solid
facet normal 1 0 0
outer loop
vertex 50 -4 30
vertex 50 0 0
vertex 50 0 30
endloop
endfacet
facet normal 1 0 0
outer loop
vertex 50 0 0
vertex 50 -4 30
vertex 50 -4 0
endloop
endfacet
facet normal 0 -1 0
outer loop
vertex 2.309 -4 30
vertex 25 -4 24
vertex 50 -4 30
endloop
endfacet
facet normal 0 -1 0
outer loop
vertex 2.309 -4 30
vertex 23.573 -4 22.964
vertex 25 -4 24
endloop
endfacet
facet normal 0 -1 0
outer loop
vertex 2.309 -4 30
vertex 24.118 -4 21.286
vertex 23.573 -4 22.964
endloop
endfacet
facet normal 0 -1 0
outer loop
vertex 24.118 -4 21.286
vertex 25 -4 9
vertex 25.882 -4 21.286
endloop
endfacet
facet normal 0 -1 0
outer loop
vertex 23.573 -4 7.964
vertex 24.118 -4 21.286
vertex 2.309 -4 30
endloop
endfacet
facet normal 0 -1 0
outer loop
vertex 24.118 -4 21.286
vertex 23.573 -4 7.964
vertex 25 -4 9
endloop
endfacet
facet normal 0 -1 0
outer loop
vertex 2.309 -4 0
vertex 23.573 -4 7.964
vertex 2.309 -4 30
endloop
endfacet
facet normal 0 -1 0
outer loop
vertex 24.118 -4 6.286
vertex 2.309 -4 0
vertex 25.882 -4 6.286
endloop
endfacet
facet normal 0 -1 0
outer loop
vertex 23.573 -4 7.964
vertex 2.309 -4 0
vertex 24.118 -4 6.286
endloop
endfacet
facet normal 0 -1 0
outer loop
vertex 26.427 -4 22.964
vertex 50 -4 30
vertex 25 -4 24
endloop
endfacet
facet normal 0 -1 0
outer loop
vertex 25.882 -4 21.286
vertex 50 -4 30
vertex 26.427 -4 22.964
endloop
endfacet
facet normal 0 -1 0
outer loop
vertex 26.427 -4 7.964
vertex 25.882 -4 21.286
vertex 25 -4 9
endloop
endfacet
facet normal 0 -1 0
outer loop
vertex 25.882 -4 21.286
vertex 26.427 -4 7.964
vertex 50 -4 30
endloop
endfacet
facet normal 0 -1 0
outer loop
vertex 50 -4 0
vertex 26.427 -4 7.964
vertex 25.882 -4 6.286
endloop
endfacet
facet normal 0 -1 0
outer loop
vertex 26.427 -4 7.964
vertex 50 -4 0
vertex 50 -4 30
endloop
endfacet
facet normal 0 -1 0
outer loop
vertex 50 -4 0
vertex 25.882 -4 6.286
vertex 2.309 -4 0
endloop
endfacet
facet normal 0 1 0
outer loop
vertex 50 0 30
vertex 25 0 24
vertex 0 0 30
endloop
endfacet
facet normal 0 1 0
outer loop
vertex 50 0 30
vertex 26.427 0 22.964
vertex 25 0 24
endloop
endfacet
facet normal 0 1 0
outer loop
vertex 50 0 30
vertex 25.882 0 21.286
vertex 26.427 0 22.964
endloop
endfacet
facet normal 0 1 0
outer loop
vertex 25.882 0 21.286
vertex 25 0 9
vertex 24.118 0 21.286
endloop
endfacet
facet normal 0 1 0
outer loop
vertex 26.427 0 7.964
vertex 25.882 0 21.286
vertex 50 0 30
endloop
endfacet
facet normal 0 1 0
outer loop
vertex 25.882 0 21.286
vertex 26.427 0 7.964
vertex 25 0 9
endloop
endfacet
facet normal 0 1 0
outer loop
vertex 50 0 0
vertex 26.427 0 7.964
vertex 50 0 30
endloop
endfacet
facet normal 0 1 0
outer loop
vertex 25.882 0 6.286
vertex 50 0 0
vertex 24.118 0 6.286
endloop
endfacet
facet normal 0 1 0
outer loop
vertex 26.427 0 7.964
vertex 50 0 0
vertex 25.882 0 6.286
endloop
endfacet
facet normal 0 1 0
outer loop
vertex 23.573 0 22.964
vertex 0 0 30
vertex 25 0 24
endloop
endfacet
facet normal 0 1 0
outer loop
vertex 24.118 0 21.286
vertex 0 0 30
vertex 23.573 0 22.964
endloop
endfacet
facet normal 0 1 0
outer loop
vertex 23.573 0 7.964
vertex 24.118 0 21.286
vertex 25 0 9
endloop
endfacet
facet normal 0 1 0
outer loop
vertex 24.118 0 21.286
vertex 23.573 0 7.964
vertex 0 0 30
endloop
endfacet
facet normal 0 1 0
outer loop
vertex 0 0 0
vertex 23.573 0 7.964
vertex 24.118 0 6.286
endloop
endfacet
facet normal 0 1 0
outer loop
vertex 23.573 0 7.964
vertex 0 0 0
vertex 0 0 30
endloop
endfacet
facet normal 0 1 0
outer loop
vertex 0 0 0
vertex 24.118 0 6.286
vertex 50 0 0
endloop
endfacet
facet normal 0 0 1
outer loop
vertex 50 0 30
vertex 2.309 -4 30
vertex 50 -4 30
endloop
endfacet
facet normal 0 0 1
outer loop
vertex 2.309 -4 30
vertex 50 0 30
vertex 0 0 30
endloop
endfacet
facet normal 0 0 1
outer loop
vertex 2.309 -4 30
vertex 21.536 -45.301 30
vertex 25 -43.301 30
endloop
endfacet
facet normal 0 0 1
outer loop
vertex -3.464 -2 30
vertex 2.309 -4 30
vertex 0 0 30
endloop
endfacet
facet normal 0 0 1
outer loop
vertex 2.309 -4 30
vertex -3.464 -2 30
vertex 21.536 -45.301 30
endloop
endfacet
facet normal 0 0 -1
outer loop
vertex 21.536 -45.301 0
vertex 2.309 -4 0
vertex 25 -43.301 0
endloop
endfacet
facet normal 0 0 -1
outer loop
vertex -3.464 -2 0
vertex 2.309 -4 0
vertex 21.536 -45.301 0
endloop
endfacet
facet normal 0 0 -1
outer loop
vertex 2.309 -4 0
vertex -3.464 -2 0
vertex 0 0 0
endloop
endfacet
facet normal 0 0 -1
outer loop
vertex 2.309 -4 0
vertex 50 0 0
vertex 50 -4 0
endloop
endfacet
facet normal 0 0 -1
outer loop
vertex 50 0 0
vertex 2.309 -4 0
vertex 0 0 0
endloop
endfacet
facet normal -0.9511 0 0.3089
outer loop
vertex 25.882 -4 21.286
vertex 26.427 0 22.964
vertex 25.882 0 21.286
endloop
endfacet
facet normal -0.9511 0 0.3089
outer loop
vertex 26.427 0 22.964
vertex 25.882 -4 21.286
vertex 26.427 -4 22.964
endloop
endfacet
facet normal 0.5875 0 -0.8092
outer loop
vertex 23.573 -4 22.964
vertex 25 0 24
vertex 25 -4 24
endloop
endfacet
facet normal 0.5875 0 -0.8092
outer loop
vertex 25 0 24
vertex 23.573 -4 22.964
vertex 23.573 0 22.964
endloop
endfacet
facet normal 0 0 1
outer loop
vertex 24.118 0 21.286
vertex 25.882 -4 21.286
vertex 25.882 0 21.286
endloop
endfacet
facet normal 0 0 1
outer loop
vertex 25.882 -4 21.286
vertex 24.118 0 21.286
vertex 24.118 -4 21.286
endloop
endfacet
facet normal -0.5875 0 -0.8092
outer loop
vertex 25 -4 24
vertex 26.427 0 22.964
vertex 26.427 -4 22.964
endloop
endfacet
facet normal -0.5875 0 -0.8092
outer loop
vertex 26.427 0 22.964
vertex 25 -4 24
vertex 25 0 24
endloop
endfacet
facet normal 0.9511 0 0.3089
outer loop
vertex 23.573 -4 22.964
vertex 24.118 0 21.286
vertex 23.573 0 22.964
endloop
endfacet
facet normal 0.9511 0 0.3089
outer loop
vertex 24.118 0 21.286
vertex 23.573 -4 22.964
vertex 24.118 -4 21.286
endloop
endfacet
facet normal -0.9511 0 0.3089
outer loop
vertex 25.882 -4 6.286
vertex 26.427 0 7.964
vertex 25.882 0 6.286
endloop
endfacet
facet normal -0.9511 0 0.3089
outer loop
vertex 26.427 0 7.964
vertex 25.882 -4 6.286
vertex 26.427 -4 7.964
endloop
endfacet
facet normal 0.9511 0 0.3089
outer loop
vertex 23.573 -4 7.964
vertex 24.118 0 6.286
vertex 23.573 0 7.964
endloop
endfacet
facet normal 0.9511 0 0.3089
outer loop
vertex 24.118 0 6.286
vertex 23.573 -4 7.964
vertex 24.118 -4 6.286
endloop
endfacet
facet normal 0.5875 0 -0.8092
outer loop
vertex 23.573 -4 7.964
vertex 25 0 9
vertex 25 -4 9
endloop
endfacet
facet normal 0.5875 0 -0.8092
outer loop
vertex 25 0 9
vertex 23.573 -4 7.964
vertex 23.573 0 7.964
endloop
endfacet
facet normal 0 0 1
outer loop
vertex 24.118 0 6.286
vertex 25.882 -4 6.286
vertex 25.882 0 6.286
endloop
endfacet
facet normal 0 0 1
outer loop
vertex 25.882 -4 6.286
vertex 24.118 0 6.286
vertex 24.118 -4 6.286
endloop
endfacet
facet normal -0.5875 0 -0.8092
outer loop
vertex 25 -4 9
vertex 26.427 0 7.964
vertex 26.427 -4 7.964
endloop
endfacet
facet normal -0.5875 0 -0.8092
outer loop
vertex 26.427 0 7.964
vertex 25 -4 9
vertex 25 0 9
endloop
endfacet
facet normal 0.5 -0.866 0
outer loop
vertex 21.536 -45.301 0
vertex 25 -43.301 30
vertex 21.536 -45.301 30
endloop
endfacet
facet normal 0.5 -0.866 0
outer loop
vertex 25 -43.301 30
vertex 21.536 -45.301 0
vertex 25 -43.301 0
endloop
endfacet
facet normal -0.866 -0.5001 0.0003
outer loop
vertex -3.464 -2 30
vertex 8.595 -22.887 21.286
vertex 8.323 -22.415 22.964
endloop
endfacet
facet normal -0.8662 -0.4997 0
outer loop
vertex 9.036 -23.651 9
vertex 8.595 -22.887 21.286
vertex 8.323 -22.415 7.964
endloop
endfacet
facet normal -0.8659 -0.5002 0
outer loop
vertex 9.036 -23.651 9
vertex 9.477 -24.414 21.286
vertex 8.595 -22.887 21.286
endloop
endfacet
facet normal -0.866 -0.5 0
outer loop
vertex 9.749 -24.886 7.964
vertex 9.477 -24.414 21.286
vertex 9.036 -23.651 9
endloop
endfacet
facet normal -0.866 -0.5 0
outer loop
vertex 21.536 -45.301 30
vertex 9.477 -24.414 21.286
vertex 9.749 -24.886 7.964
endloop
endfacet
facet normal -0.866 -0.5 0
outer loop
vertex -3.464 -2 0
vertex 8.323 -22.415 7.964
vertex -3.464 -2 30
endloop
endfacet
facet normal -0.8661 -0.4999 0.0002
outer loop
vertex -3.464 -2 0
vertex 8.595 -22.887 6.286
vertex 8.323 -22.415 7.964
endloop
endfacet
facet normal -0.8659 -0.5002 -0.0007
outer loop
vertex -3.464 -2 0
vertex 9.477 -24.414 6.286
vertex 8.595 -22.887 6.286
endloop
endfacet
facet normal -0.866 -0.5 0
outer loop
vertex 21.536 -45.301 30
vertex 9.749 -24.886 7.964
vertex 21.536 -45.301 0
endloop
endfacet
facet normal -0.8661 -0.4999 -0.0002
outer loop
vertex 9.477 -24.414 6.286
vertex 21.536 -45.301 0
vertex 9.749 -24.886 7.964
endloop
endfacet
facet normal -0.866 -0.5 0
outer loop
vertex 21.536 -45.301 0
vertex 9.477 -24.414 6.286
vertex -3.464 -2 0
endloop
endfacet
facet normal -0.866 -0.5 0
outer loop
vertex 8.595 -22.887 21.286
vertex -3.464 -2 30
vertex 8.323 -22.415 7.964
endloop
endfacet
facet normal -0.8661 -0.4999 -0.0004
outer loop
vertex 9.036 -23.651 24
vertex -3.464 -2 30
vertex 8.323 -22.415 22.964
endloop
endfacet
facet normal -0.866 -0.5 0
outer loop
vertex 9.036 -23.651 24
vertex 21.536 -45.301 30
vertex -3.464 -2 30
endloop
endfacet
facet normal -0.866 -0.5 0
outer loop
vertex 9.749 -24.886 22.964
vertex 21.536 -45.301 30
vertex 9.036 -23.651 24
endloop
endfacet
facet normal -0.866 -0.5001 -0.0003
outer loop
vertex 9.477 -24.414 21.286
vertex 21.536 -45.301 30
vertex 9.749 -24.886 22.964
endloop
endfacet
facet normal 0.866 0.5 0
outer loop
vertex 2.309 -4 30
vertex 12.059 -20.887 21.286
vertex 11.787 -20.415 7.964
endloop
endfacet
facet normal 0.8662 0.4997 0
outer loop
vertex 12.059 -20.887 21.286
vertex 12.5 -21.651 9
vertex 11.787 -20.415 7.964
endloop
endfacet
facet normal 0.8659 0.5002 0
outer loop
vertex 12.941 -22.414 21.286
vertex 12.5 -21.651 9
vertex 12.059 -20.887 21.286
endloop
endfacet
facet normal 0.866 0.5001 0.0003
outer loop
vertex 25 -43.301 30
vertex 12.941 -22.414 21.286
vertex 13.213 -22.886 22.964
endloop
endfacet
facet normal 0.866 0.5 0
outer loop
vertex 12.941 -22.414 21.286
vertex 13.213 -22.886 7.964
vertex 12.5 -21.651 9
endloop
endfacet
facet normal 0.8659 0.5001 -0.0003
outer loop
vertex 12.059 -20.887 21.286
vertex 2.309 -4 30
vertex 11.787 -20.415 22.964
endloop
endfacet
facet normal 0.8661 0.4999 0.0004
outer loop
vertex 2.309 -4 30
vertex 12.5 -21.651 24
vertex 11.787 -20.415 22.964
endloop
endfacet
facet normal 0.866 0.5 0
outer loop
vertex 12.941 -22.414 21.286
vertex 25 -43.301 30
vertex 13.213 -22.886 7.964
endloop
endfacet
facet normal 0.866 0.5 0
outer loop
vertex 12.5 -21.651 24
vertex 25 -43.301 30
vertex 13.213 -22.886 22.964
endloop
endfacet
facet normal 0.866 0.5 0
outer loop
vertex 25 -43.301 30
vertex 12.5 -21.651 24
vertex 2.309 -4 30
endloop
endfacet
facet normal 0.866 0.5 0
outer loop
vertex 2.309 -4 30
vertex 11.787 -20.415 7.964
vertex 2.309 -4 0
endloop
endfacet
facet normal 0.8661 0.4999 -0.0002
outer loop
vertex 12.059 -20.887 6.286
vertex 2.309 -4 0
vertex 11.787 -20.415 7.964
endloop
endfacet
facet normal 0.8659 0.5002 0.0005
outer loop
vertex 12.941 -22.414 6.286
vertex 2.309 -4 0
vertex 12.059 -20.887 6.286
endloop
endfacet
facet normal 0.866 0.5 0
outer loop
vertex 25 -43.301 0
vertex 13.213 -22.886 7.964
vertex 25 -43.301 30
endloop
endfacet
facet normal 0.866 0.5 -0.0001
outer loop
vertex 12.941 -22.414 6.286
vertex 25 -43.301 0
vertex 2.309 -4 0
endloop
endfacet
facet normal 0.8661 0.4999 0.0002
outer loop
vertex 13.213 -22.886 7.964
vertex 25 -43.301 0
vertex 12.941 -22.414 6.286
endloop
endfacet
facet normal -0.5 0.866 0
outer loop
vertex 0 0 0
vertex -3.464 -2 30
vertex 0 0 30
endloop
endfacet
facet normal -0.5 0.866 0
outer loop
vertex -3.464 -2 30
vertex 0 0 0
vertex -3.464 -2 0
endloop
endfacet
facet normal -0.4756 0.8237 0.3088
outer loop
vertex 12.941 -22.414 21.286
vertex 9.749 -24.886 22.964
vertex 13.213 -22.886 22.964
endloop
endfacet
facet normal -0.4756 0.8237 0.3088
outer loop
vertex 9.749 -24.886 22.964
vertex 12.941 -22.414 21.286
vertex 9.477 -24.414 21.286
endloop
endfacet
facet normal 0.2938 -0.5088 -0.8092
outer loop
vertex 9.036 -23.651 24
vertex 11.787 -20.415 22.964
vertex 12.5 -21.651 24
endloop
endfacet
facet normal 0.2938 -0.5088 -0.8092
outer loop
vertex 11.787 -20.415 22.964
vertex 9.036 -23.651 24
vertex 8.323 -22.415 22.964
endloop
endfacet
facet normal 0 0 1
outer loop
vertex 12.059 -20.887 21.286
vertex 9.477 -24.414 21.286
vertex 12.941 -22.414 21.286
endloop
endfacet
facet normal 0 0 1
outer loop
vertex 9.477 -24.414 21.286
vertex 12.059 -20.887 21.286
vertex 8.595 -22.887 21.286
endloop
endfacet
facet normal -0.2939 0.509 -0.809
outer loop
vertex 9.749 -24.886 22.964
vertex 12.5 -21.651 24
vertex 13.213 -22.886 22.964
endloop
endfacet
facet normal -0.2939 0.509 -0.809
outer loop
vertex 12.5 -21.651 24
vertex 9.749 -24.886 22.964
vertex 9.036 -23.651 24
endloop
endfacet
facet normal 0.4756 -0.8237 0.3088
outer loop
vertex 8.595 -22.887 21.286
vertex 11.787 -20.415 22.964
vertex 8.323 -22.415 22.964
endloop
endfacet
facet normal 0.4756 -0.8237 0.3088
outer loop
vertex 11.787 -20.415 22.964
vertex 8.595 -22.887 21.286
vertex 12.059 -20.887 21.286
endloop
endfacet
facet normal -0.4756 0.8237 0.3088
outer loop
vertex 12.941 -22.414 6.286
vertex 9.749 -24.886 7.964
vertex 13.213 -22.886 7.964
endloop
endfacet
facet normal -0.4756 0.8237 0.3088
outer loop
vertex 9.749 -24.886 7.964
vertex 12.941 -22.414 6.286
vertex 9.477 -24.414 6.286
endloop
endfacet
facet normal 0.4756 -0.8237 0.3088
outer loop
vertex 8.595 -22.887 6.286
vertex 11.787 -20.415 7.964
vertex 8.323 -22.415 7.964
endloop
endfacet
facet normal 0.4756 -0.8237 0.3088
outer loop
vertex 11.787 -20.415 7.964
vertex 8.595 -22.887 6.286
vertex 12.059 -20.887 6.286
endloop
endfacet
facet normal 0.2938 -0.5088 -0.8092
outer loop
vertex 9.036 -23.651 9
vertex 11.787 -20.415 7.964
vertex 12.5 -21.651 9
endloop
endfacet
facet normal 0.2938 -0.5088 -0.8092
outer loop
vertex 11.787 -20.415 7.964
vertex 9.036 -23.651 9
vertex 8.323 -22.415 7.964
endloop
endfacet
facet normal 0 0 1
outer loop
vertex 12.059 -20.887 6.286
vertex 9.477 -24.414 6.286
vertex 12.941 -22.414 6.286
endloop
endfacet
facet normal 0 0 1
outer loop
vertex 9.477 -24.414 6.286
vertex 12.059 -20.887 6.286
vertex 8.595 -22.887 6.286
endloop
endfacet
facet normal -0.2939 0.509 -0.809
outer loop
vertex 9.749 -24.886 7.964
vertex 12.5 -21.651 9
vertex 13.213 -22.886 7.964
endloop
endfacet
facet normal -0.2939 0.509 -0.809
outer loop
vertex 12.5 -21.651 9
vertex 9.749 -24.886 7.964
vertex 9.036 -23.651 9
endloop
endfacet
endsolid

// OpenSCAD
width=30;
thickness=4;
drill_dia=3;


module mount(length) {
	difference() {
		cube([length,width,thickness]);
		translate([length/2,width/2+width/4,0]) rotate([0,0,90]) cylinder(thickness*2, drill_dia/2,drill_dia/2);
		translate([length/2,width/2-width/4,0]) rotate([0,0,90]) cylinder(thickness*2, drill_dia/2,drill_dia/2);

	}
}

rotate([90,0,0]) {
	mount(50);
	rotate([0,-60,0]) mount(50);
}
